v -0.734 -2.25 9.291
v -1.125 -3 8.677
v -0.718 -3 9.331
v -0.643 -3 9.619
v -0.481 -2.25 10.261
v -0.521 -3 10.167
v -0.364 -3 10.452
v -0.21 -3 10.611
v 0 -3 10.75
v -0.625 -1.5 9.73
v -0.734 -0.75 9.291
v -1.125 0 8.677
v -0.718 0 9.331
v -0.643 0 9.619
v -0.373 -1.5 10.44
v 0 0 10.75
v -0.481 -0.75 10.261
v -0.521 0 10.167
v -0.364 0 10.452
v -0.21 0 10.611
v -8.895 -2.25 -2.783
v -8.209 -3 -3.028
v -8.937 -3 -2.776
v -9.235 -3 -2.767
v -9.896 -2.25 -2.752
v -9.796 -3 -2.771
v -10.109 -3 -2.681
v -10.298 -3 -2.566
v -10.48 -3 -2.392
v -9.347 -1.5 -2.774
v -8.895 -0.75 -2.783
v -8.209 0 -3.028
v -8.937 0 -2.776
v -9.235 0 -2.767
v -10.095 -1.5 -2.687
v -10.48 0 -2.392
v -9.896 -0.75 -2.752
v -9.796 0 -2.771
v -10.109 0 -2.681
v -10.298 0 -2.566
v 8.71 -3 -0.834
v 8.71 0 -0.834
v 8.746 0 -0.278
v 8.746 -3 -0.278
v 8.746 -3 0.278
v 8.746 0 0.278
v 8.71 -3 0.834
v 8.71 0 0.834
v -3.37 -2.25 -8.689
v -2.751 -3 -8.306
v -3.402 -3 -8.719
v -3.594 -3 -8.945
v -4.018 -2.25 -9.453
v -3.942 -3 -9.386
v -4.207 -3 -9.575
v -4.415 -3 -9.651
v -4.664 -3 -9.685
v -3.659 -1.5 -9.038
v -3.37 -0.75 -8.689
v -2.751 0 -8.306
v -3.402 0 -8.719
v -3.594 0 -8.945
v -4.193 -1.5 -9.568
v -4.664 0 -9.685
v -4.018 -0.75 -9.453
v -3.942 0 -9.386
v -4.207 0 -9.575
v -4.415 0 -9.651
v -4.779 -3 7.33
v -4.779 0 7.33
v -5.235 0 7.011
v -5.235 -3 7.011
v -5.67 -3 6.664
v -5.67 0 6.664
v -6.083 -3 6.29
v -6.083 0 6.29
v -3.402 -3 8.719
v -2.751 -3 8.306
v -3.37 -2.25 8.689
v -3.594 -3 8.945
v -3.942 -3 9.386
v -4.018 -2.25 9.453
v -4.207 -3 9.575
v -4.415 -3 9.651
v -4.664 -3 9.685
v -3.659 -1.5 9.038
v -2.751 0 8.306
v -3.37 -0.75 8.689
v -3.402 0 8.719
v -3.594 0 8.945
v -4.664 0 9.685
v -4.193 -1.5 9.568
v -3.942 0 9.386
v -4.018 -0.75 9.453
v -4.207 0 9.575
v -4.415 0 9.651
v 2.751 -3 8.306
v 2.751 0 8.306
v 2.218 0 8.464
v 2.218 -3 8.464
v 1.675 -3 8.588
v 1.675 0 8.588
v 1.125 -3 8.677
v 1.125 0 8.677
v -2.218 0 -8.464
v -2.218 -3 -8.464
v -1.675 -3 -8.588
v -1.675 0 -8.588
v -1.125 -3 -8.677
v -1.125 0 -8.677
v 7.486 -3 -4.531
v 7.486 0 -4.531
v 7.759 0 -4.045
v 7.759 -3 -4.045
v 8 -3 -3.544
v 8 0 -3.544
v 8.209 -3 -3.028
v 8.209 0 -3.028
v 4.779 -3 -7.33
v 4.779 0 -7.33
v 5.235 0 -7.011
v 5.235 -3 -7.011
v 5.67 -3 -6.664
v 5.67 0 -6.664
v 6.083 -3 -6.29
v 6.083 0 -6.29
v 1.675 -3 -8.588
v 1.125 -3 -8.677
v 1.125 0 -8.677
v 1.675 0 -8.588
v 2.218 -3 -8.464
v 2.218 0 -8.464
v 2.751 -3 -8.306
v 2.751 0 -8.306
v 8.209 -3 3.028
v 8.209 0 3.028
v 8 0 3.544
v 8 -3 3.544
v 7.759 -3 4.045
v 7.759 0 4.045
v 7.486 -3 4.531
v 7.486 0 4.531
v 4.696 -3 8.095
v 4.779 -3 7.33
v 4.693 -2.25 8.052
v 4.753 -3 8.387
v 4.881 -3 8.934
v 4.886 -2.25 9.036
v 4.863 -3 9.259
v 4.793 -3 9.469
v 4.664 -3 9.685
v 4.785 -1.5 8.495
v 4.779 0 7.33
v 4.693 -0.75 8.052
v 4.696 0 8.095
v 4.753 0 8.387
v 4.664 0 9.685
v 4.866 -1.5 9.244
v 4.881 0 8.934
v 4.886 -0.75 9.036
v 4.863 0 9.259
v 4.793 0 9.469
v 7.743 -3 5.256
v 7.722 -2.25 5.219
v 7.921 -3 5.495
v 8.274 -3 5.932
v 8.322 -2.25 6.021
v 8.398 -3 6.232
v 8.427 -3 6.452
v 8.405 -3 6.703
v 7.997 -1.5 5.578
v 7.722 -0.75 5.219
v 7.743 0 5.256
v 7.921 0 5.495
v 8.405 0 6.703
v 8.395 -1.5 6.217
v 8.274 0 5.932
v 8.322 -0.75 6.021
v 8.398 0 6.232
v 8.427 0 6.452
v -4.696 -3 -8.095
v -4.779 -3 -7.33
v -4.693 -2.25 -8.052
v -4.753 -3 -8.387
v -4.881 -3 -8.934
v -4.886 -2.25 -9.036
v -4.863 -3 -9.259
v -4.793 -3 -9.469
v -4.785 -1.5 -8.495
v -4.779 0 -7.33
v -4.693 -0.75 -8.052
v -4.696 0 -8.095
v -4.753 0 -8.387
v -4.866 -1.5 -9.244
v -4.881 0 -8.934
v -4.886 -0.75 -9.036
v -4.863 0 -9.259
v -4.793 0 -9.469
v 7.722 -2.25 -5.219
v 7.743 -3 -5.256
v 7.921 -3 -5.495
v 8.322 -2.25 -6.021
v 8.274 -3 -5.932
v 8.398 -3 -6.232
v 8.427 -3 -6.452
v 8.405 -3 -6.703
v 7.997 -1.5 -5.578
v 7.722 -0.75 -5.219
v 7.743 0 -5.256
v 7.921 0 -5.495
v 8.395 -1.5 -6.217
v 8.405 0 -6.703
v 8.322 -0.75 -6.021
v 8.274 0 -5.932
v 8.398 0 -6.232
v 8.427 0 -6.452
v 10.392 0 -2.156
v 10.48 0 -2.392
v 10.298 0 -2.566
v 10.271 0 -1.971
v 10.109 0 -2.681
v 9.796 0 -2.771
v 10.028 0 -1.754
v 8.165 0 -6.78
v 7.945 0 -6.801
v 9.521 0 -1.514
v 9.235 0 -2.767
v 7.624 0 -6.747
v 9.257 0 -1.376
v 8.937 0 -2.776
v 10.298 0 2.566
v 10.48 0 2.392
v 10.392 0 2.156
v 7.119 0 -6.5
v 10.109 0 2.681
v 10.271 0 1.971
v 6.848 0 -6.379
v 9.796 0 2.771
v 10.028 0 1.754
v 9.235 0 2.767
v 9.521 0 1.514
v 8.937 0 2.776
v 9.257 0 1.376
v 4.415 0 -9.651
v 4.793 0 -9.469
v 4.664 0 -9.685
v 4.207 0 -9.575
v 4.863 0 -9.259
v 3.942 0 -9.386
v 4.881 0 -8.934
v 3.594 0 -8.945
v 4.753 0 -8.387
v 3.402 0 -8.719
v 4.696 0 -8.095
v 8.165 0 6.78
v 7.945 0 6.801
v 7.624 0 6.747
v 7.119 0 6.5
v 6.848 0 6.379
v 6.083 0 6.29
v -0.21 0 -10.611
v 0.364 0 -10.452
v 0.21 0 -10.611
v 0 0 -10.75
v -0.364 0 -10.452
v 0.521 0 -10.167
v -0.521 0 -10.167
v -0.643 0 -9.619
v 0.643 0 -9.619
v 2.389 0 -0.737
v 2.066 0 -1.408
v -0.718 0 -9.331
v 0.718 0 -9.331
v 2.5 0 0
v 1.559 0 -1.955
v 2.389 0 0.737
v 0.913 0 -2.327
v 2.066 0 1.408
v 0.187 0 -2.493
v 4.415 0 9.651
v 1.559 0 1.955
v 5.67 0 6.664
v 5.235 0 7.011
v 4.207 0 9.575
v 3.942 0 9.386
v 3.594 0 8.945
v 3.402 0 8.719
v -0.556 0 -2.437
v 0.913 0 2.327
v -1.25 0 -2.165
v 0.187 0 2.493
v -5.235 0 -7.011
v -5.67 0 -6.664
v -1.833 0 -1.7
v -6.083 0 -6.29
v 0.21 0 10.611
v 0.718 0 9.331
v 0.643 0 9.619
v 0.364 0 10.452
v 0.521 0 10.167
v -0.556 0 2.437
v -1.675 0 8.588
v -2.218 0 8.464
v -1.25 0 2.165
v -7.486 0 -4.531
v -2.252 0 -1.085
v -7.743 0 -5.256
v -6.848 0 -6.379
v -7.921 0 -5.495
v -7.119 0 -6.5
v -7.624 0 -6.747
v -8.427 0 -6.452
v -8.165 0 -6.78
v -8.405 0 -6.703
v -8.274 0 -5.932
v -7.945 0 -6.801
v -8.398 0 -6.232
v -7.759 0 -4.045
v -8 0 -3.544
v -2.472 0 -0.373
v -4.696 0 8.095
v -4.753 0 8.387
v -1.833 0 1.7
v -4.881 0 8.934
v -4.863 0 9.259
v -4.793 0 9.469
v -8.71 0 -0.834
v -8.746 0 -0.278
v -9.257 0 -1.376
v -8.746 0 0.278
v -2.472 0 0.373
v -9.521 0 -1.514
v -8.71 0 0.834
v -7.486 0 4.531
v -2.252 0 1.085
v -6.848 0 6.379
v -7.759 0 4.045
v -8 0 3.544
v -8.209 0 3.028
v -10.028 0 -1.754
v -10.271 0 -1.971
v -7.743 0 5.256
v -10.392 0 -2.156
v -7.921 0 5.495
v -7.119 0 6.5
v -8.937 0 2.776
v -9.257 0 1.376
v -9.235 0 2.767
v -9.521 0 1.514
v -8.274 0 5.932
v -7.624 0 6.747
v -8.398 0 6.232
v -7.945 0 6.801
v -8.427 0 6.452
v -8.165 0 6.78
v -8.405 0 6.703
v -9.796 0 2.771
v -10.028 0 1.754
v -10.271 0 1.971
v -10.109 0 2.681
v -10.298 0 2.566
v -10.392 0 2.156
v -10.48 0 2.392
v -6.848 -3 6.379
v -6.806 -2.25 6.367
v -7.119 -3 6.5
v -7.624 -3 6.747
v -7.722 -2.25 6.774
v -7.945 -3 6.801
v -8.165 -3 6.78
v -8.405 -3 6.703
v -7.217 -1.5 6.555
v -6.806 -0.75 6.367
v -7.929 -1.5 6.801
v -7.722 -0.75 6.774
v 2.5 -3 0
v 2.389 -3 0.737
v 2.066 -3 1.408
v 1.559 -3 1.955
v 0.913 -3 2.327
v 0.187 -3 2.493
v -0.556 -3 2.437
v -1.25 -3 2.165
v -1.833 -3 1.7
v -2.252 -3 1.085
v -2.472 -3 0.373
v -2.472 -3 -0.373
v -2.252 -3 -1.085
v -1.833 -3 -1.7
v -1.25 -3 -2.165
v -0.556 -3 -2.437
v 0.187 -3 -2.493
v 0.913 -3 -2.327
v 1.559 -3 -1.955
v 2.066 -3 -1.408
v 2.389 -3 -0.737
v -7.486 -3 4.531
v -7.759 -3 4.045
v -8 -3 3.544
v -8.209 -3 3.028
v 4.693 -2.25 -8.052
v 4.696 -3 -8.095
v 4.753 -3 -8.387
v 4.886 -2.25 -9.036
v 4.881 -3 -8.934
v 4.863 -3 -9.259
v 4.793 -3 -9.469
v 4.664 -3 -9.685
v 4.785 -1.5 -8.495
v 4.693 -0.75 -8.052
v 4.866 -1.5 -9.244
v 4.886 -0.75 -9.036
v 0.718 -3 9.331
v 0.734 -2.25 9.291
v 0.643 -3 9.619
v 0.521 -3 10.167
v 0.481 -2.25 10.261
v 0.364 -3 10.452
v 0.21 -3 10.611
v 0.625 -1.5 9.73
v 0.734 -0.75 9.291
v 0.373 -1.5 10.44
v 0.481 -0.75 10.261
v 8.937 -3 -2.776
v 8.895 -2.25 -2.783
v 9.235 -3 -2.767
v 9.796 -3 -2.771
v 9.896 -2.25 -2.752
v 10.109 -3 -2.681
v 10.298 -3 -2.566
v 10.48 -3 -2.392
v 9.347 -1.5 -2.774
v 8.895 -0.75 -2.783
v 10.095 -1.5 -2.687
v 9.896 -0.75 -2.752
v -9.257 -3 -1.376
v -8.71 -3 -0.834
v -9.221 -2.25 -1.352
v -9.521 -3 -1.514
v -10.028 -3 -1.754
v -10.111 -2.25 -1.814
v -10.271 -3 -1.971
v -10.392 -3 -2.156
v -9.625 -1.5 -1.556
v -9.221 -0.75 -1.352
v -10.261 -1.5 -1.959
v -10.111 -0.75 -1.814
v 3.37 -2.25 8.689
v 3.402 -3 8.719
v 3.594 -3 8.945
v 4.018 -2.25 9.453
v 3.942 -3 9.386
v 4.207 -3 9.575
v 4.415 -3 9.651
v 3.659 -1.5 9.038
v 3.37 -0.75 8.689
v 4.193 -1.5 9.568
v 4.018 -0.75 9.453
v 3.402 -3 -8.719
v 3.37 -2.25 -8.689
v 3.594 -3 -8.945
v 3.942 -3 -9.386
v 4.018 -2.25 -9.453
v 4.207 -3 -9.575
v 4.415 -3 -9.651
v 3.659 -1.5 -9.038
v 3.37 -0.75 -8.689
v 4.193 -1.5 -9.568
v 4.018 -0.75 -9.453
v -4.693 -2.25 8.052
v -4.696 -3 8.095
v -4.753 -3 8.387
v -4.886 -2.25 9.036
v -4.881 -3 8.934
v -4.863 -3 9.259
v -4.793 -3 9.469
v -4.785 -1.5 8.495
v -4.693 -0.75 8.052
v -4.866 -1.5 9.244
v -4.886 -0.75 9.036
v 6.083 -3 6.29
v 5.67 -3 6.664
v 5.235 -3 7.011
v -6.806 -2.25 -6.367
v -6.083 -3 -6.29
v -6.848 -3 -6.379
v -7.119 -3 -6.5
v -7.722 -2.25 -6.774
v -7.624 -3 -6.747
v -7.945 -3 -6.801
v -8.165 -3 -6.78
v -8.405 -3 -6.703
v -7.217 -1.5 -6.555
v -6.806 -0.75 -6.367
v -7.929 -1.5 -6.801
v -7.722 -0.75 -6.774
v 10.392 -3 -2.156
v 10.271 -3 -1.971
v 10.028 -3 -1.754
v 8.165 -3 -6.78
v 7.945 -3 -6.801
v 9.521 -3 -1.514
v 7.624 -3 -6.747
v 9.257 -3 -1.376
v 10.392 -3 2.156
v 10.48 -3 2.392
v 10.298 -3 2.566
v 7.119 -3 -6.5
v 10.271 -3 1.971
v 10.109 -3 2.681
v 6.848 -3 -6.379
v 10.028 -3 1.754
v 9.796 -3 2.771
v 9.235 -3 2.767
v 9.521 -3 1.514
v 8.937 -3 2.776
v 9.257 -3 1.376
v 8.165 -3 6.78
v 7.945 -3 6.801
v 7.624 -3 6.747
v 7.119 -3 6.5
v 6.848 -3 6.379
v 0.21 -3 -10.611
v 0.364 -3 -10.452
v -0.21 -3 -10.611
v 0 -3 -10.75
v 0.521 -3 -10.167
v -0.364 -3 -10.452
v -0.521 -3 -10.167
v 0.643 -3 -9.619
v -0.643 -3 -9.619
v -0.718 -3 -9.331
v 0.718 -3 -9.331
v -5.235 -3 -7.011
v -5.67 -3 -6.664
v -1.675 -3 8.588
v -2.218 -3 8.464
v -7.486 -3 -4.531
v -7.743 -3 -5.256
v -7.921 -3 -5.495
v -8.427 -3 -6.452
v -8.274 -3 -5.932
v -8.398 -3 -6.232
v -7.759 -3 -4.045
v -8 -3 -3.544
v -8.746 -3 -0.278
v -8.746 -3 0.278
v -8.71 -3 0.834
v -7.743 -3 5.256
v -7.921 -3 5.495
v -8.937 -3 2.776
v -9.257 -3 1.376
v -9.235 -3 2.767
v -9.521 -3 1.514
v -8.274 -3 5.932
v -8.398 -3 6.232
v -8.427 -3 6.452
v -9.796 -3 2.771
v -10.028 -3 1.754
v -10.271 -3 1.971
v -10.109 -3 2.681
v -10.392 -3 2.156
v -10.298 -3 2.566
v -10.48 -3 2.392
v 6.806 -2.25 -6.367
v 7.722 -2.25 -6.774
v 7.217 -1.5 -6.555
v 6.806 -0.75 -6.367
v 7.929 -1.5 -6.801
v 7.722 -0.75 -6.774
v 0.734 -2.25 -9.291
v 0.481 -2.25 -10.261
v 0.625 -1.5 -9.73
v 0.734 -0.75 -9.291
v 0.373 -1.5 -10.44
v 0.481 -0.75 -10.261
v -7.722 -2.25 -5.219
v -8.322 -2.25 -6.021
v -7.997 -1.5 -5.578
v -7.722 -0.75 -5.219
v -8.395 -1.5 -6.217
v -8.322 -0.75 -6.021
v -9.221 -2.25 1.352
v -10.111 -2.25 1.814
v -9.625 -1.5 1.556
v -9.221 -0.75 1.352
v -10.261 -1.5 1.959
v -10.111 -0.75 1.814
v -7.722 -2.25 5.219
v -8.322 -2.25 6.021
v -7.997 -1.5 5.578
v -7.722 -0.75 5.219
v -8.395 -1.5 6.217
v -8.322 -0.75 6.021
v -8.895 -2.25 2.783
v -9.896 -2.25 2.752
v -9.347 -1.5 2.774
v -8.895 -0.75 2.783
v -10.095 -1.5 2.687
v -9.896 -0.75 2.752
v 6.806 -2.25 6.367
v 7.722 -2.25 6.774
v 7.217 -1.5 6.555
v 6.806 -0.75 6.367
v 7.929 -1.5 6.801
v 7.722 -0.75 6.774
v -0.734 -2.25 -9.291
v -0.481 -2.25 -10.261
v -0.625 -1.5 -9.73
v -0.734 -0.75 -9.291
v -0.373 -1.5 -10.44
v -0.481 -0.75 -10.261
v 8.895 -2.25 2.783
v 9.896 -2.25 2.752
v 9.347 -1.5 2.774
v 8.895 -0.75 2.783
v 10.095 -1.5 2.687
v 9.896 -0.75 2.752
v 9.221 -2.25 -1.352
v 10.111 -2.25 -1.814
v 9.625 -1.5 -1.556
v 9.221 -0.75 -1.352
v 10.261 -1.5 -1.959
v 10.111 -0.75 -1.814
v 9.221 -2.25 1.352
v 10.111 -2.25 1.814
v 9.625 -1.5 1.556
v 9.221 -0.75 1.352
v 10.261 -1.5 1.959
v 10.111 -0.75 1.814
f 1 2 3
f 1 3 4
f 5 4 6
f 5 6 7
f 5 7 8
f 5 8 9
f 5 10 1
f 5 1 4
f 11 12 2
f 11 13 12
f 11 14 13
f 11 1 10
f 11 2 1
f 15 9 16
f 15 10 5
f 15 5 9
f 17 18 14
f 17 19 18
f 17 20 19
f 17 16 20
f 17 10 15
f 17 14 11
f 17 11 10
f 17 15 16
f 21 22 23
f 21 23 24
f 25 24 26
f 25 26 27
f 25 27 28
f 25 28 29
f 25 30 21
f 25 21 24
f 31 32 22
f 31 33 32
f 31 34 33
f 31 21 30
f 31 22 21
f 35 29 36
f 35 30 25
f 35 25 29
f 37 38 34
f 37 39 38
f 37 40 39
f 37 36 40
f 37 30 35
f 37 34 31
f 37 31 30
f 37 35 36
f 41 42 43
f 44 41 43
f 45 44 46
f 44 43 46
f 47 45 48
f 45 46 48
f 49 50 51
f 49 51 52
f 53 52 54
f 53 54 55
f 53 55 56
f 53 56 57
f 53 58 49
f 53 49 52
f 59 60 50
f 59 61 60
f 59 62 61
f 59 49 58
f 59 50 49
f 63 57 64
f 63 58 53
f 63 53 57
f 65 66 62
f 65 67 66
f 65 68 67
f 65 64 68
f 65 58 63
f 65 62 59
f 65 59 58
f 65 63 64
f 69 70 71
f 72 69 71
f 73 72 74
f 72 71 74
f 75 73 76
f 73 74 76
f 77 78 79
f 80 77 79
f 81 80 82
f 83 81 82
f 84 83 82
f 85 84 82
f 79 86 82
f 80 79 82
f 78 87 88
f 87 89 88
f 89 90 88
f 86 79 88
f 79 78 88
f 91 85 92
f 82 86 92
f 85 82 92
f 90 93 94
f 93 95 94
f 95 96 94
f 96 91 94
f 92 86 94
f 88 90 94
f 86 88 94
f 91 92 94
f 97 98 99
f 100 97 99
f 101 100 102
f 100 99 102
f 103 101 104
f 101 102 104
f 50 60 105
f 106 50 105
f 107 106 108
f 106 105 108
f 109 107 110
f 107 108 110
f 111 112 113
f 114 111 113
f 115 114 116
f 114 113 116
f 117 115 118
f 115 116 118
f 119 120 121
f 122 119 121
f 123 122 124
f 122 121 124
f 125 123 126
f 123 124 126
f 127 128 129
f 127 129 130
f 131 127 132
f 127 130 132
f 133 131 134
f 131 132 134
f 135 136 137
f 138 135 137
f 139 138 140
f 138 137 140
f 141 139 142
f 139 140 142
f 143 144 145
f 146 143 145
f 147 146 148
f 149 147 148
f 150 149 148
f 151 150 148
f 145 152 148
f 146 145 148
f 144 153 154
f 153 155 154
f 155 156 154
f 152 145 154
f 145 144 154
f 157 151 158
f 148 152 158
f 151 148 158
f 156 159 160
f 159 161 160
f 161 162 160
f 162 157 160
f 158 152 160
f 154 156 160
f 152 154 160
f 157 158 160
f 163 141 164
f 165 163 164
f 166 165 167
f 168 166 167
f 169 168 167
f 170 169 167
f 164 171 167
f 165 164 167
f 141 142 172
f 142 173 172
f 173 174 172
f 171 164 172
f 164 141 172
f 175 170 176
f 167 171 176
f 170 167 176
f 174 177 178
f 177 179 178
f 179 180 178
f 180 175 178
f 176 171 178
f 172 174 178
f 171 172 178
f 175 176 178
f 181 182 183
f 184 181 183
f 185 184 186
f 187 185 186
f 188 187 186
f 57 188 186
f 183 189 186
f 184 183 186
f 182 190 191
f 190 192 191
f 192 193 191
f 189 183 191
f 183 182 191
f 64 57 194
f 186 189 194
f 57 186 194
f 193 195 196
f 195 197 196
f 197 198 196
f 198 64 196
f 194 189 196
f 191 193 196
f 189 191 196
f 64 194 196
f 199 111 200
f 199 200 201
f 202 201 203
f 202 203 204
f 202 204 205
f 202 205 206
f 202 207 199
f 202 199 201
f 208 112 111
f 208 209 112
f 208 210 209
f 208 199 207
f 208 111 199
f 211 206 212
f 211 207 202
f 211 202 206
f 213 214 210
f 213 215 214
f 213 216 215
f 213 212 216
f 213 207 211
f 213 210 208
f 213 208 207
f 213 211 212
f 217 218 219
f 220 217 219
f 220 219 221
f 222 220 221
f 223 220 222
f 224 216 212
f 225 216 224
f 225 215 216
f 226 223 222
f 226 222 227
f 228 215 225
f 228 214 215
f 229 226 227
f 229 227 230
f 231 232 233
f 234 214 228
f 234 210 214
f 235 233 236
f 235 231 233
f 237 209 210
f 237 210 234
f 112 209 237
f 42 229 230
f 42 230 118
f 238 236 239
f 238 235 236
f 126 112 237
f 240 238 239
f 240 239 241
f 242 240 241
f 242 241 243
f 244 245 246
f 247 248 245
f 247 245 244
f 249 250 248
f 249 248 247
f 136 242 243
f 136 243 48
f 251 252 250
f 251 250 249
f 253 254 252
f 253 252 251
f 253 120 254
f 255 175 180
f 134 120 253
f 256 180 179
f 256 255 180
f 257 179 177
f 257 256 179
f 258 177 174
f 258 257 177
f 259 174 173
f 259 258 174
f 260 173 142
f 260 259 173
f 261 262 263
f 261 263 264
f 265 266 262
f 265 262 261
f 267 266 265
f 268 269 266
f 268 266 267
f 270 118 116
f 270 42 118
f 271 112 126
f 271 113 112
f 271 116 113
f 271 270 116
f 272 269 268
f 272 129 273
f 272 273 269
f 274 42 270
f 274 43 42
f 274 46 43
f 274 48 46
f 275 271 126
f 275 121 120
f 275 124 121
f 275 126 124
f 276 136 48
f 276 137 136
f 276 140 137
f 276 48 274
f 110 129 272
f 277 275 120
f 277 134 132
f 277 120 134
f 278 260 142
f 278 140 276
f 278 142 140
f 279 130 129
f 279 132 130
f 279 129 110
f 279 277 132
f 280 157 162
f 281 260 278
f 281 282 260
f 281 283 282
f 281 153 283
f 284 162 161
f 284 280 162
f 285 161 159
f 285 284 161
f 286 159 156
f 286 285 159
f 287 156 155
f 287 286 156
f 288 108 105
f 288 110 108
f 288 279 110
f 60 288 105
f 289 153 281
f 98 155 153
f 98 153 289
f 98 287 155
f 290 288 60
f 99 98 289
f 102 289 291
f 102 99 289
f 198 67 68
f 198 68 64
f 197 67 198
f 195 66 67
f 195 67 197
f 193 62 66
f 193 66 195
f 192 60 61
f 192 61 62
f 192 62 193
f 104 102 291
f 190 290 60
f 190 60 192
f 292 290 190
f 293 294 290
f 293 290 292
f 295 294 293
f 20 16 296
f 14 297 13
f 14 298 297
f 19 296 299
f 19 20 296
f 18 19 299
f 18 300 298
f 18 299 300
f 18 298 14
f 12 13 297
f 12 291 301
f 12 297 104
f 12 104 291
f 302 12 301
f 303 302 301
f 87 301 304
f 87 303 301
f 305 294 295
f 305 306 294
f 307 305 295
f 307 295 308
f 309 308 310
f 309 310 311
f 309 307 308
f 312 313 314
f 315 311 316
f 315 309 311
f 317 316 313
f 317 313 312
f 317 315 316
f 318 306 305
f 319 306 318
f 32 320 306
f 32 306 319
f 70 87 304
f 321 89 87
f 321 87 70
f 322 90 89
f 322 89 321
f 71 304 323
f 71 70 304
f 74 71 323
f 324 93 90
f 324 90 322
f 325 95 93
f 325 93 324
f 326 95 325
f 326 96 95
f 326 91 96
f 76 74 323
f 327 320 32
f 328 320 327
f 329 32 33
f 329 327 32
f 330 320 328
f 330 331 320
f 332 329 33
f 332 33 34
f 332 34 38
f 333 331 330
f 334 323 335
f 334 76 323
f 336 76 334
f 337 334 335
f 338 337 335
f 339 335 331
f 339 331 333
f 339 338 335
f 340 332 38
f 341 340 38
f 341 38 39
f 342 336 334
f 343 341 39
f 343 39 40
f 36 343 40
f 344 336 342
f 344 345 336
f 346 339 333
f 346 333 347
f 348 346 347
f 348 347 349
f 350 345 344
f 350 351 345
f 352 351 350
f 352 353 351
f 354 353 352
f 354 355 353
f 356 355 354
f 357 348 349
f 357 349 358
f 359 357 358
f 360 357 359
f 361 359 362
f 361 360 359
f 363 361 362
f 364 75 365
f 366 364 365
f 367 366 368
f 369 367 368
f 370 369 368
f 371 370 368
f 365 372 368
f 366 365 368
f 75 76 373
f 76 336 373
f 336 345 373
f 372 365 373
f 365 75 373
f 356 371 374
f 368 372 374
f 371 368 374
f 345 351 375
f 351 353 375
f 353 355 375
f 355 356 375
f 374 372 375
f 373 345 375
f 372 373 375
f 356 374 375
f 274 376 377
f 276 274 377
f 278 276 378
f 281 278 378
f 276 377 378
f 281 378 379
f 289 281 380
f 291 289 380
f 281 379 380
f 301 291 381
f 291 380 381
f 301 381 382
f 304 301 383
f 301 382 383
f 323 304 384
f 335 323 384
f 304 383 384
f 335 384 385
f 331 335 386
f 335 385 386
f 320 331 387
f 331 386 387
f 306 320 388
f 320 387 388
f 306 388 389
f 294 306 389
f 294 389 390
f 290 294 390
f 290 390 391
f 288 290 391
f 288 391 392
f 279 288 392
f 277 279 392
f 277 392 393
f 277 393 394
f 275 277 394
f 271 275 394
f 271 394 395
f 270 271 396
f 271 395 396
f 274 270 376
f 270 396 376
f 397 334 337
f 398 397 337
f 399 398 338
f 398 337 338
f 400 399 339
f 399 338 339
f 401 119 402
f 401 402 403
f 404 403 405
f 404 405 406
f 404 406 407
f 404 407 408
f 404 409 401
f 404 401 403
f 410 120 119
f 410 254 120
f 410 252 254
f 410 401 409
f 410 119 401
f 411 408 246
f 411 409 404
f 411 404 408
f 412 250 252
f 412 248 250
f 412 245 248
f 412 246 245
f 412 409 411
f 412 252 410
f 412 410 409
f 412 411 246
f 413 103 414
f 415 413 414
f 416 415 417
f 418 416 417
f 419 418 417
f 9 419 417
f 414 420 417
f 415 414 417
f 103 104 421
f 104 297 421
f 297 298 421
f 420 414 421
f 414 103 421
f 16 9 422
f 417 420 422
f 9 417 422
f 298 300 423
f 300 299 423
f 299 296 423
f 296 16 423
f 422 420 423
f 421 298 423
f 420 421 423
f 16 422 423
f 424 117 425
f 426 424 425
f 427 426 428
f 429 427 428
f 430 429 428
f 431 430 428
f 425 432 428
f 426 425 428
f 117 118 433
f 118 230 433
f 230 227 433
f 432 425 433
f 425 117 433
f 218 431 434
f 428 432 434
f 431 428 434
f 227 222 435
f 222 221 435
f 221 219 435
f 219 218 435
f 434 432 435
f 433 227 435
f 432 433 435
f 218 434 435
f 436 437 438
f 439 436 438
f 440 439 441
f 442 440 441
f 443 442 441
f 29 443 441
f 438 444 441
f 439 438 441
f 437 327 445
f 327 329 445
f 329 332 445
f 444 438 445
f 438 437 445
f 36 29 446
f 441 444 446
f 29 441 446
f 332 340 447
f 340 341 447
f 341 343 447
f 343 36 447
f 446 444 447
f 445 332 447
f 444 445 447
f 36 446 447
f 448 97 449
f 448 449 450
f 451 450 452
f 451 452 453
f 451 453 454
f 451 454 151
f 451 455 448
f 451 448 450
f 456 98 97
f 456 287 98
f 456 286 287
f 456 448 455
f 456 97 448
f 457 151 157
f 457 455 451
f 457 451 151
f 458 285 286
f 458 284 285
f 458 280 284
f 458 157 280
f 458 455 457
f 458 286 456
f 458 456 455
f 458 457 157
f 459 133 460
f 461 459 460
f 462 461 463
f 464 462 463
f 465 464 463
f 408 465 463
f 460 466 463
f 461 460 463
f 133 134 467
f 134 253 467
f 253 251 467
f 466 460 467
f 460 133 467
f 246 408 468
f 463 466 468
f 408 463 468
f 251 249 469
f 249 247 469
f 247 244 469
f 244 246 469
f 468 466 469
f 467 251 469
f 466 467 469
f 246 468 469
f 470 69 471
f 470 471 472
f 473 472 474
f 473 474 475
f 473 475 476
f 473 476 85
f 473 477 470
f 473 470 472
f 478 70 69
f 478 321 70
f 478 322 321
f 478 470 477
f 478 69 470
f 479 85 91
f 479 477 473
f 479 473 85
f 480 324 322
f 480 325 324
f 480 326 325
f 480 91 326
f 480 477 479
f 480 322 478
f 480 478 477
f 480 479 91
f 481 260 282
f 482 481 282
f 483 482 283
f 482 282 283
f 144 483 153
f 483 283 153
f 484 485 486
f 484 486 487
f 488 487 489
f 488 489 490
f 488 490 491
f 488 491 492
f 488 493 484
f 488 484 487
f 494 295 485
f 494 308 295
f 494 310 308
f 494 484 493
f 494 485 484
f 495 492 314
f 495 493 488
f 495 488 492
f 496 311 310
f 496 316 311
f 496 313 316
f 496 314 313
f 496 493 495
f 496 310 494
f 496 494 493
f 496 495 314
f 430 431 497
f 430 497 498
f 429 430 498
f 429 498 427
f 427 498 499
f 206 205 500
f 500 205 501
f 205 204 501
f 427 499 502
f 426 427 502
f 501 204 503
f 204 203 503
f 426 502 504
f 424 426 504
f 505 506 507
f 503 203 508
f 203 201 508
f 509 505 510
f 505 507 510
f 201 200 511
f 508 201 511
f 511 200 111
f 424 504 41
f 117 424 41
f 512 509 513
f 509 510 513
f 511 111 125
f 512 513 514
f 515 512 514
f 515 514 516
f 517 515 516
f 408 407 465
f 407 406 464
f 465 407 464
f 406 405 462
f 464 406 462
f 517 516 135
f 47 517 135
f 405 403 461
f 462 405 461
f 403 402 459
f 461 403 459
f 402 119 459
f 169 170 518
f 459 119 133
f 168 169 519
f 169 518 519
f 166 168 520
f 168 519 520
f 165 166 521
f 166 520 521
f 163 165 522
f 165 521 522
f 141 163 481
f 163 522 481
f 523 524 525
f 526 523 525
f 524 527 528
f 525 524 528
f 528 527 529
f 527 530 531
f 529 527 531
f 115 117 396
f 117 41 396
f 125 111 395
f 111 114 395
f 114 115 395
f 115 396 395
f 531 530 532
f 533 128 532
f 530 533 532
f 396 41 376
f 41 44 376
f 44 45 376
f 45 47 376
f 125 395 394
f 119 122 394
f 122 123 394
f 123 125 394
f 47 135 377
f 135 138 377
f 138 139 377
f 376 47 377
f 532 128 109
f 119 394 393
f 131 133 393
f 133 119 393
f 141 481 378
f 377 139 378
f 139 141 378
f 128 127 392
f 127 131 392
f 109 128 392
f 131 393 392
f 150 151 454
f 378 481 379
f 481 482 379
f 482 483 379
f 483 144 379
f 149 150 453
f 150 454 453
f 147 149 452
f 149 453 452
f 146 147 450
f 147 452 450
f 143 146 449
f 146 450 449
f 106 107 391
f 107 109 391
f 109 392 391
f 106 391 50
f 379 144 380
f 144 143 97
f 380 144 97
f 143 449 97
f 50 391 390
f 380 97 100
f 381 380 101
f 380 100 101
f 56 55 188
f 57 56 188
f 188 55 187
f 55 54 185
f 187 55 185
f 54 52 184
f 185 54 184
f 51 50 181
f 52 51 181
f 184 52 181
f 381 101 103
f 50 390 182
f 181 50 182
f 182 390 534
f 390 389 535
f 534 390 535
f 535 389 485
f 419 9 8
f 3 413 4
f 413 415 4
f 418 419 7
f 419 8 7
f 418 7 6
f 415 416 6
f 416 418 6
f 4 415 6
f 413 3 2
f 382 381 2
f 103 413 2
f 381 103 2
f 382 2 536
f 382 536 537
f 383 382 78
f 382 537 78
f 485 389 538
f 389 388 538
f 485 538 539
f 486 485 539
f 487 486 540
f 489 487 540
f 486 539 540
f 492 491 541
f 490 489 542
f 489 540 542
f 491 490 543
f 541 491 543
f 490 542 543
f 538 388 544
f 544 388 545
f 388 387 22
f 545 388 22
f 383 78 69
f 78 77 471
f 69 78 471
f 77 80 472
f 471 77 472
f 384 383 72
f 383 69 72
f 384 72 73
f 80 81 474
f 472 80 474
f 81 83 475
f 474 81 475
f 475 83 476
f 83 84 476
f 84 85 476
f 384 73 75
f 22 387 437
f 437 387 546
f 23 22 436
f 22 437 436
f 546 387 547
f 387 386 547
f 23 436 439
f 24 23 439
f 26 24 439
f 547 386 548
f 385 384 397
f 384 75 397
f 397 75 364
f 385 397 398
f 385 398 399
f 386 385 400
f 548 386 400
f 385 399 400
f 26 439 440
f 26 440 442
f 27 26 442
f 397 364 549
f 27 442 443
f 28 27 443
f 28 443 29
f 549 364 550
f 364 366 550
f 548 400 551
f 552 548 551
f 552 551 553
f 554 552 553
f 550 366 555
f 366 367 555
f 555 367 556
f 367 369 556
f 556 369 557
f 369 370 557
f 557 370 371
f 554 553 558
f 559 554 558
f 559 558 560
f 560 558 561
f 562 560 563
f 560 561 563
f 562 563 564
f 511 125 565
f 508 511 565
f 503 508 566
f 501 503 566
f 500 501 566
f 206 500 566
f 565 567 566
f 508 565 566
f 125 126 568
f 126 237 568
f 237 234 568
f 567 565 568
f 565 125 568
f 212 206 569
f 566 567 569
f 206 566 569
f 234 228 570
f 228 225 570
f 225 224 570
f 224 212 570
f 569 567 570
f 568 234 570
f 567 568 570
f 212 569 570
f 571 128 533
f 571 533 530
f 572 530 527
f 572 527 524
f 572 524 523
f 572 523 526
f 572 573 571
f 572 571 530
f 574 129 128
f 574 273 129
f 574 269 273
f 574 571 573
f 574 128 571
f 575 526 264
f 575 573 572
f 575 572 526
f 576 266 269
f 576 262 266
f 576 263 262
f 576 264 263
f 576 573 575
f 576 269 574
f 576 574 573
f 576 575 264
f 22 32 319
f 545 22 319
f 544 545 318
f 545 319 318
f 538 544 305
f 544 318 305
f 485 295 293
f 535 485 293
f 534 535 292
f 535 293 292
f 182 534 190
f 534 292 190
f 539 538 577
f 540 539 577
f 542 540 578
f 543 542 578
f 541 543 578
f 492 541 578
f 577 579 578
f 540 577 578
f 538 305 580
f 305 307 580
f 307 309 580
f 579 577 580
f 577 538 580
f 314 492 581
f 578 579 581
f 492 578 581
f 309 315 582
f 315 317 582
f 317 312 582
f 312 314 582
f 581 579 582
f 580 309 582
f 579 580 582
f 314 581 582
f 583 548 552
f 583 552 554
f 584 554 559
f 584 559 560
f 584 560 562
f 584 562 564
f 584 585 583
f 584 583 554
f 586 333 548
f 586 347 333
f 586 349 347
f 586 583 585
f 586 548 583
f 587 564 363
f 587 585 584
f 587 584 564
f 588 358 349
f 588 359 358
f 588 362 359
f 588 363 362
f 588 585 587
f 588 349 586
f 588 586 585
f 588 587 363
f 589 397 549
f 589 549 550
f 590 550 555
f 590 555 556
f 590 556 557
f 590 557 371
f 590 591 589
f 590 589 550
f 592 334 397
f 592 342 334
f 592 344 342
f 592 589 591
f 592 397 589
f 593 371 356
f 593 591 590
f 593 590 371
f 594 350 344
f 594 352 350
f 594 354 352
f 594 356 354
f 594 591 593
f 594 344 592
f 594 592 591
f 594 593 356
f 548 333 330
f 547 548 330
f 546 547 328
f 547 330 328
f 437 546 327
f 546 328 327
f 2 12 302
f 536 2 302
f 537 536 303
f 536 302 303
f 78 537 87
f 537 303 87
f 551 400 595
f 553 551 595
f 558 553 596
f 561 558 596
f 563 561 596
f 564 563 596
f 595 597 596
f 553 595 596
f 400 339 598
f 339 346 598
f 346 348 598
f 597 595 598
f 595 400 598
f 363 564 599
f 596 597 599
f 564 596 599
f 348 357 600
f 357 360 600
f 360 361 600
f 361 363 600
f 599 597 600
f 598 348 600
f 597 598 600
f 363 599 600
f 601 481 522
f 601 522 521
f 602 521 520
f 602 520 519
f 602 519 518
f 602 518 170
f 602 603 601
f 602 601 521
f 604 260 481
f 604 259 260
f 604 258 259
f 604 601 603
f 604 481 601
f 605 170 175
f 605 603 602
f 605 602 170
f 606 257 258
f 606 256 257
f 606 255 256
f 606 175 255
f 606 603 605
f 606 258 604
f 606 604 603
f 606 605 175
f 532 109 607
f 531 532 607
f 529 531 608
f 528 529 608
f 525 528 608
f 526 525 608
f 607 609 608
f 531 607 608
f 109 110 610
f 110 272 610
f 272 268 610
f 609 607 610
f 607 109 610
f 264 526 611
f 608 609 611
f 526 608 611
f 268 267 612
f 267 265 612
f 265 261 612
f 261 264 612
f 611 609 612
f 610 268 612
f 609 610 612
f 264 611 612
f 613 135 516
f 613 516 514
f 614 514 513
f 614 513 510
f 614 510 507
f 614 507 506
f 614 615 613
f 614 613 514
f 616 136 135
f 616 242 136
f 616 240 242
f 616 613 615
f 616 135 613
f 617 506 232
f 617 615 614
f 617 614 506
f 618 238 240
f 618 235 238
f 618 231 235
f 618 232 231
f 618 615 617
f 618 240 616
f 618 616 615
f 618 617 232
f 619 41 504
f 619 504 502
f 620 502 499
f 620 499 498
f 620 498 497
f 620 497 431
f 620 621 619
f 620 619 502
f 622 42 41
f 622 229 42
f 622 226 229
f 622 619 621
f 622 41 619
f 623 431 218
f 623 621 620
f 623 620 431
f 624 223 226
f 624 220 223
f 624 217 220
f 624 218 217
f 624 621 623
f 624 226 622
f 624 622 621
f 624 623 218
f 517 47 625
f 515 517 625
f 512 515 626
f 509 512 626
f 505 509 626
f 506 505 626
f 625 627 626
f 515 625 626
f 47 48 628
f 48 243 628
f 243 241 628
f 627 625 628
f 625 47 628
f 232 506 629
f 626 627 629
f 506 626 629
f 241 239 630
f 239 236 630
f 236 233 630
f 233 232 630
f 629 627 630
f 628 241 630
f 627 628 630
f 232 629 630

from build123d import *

# Parameters (mm, degrees)
F1_DEPTH = 3
F3_COUNT = 14
F4_R     = 2.5
F5_DEPTH = 3


with BuildPart() as f1:
    # F0 (on Front) → F1 (new body)
    with BuildSketch(Plane.XZ):
        with BuildLine():
            add(Edge.make_bspline(
                [(-1.125, 8.6773771959), (-0.7, 9.2234754838), (-0.6486890223, 9.6124048493), (-0.5, 10.4880884817), (0, 10.75)],
                knots=[0, 0, 0, 0, 0.4967173091, 1, 1, 1, 1], degree=3))
            ThreePointArc((-1.125, 8.6773771959), (0, -8.75), (1.125, 8.6773771959))
            add(Edge.make_bspline(
                [(1.125, 8.6773771959), (0.7, 9.2234754838), (0.6486890223, 9.6124048493), (0.5, 10.4880884817), (0, 10.75)],
                knots=[0, 0, 0, 0, 0.4967173091, 1, 1, 1, 1], degree=3))
        make_face()
    extrude(amount=F1_DEPTH)

    # F3: F1 ×14 about axis
    f3_axis = Axis((0, 2.5461101905, 0), (0, 1, 0))


with BuildPart() as f1_1:
    add(f1.part)
    for i in range(1, F3_COUNT):
        add(f1.part.rotate(f3_axis, i * 360 / F3_COUNT))

    # F4 (on face) → F5 (cut, through all)
    with BuildSketch(Plane.XZ.offset(3)):
        Circle(F4_R)
    extrude(amount=-F5_DEPTH, mode=Mode.SUBTRACT)


solid = f1_1.part
